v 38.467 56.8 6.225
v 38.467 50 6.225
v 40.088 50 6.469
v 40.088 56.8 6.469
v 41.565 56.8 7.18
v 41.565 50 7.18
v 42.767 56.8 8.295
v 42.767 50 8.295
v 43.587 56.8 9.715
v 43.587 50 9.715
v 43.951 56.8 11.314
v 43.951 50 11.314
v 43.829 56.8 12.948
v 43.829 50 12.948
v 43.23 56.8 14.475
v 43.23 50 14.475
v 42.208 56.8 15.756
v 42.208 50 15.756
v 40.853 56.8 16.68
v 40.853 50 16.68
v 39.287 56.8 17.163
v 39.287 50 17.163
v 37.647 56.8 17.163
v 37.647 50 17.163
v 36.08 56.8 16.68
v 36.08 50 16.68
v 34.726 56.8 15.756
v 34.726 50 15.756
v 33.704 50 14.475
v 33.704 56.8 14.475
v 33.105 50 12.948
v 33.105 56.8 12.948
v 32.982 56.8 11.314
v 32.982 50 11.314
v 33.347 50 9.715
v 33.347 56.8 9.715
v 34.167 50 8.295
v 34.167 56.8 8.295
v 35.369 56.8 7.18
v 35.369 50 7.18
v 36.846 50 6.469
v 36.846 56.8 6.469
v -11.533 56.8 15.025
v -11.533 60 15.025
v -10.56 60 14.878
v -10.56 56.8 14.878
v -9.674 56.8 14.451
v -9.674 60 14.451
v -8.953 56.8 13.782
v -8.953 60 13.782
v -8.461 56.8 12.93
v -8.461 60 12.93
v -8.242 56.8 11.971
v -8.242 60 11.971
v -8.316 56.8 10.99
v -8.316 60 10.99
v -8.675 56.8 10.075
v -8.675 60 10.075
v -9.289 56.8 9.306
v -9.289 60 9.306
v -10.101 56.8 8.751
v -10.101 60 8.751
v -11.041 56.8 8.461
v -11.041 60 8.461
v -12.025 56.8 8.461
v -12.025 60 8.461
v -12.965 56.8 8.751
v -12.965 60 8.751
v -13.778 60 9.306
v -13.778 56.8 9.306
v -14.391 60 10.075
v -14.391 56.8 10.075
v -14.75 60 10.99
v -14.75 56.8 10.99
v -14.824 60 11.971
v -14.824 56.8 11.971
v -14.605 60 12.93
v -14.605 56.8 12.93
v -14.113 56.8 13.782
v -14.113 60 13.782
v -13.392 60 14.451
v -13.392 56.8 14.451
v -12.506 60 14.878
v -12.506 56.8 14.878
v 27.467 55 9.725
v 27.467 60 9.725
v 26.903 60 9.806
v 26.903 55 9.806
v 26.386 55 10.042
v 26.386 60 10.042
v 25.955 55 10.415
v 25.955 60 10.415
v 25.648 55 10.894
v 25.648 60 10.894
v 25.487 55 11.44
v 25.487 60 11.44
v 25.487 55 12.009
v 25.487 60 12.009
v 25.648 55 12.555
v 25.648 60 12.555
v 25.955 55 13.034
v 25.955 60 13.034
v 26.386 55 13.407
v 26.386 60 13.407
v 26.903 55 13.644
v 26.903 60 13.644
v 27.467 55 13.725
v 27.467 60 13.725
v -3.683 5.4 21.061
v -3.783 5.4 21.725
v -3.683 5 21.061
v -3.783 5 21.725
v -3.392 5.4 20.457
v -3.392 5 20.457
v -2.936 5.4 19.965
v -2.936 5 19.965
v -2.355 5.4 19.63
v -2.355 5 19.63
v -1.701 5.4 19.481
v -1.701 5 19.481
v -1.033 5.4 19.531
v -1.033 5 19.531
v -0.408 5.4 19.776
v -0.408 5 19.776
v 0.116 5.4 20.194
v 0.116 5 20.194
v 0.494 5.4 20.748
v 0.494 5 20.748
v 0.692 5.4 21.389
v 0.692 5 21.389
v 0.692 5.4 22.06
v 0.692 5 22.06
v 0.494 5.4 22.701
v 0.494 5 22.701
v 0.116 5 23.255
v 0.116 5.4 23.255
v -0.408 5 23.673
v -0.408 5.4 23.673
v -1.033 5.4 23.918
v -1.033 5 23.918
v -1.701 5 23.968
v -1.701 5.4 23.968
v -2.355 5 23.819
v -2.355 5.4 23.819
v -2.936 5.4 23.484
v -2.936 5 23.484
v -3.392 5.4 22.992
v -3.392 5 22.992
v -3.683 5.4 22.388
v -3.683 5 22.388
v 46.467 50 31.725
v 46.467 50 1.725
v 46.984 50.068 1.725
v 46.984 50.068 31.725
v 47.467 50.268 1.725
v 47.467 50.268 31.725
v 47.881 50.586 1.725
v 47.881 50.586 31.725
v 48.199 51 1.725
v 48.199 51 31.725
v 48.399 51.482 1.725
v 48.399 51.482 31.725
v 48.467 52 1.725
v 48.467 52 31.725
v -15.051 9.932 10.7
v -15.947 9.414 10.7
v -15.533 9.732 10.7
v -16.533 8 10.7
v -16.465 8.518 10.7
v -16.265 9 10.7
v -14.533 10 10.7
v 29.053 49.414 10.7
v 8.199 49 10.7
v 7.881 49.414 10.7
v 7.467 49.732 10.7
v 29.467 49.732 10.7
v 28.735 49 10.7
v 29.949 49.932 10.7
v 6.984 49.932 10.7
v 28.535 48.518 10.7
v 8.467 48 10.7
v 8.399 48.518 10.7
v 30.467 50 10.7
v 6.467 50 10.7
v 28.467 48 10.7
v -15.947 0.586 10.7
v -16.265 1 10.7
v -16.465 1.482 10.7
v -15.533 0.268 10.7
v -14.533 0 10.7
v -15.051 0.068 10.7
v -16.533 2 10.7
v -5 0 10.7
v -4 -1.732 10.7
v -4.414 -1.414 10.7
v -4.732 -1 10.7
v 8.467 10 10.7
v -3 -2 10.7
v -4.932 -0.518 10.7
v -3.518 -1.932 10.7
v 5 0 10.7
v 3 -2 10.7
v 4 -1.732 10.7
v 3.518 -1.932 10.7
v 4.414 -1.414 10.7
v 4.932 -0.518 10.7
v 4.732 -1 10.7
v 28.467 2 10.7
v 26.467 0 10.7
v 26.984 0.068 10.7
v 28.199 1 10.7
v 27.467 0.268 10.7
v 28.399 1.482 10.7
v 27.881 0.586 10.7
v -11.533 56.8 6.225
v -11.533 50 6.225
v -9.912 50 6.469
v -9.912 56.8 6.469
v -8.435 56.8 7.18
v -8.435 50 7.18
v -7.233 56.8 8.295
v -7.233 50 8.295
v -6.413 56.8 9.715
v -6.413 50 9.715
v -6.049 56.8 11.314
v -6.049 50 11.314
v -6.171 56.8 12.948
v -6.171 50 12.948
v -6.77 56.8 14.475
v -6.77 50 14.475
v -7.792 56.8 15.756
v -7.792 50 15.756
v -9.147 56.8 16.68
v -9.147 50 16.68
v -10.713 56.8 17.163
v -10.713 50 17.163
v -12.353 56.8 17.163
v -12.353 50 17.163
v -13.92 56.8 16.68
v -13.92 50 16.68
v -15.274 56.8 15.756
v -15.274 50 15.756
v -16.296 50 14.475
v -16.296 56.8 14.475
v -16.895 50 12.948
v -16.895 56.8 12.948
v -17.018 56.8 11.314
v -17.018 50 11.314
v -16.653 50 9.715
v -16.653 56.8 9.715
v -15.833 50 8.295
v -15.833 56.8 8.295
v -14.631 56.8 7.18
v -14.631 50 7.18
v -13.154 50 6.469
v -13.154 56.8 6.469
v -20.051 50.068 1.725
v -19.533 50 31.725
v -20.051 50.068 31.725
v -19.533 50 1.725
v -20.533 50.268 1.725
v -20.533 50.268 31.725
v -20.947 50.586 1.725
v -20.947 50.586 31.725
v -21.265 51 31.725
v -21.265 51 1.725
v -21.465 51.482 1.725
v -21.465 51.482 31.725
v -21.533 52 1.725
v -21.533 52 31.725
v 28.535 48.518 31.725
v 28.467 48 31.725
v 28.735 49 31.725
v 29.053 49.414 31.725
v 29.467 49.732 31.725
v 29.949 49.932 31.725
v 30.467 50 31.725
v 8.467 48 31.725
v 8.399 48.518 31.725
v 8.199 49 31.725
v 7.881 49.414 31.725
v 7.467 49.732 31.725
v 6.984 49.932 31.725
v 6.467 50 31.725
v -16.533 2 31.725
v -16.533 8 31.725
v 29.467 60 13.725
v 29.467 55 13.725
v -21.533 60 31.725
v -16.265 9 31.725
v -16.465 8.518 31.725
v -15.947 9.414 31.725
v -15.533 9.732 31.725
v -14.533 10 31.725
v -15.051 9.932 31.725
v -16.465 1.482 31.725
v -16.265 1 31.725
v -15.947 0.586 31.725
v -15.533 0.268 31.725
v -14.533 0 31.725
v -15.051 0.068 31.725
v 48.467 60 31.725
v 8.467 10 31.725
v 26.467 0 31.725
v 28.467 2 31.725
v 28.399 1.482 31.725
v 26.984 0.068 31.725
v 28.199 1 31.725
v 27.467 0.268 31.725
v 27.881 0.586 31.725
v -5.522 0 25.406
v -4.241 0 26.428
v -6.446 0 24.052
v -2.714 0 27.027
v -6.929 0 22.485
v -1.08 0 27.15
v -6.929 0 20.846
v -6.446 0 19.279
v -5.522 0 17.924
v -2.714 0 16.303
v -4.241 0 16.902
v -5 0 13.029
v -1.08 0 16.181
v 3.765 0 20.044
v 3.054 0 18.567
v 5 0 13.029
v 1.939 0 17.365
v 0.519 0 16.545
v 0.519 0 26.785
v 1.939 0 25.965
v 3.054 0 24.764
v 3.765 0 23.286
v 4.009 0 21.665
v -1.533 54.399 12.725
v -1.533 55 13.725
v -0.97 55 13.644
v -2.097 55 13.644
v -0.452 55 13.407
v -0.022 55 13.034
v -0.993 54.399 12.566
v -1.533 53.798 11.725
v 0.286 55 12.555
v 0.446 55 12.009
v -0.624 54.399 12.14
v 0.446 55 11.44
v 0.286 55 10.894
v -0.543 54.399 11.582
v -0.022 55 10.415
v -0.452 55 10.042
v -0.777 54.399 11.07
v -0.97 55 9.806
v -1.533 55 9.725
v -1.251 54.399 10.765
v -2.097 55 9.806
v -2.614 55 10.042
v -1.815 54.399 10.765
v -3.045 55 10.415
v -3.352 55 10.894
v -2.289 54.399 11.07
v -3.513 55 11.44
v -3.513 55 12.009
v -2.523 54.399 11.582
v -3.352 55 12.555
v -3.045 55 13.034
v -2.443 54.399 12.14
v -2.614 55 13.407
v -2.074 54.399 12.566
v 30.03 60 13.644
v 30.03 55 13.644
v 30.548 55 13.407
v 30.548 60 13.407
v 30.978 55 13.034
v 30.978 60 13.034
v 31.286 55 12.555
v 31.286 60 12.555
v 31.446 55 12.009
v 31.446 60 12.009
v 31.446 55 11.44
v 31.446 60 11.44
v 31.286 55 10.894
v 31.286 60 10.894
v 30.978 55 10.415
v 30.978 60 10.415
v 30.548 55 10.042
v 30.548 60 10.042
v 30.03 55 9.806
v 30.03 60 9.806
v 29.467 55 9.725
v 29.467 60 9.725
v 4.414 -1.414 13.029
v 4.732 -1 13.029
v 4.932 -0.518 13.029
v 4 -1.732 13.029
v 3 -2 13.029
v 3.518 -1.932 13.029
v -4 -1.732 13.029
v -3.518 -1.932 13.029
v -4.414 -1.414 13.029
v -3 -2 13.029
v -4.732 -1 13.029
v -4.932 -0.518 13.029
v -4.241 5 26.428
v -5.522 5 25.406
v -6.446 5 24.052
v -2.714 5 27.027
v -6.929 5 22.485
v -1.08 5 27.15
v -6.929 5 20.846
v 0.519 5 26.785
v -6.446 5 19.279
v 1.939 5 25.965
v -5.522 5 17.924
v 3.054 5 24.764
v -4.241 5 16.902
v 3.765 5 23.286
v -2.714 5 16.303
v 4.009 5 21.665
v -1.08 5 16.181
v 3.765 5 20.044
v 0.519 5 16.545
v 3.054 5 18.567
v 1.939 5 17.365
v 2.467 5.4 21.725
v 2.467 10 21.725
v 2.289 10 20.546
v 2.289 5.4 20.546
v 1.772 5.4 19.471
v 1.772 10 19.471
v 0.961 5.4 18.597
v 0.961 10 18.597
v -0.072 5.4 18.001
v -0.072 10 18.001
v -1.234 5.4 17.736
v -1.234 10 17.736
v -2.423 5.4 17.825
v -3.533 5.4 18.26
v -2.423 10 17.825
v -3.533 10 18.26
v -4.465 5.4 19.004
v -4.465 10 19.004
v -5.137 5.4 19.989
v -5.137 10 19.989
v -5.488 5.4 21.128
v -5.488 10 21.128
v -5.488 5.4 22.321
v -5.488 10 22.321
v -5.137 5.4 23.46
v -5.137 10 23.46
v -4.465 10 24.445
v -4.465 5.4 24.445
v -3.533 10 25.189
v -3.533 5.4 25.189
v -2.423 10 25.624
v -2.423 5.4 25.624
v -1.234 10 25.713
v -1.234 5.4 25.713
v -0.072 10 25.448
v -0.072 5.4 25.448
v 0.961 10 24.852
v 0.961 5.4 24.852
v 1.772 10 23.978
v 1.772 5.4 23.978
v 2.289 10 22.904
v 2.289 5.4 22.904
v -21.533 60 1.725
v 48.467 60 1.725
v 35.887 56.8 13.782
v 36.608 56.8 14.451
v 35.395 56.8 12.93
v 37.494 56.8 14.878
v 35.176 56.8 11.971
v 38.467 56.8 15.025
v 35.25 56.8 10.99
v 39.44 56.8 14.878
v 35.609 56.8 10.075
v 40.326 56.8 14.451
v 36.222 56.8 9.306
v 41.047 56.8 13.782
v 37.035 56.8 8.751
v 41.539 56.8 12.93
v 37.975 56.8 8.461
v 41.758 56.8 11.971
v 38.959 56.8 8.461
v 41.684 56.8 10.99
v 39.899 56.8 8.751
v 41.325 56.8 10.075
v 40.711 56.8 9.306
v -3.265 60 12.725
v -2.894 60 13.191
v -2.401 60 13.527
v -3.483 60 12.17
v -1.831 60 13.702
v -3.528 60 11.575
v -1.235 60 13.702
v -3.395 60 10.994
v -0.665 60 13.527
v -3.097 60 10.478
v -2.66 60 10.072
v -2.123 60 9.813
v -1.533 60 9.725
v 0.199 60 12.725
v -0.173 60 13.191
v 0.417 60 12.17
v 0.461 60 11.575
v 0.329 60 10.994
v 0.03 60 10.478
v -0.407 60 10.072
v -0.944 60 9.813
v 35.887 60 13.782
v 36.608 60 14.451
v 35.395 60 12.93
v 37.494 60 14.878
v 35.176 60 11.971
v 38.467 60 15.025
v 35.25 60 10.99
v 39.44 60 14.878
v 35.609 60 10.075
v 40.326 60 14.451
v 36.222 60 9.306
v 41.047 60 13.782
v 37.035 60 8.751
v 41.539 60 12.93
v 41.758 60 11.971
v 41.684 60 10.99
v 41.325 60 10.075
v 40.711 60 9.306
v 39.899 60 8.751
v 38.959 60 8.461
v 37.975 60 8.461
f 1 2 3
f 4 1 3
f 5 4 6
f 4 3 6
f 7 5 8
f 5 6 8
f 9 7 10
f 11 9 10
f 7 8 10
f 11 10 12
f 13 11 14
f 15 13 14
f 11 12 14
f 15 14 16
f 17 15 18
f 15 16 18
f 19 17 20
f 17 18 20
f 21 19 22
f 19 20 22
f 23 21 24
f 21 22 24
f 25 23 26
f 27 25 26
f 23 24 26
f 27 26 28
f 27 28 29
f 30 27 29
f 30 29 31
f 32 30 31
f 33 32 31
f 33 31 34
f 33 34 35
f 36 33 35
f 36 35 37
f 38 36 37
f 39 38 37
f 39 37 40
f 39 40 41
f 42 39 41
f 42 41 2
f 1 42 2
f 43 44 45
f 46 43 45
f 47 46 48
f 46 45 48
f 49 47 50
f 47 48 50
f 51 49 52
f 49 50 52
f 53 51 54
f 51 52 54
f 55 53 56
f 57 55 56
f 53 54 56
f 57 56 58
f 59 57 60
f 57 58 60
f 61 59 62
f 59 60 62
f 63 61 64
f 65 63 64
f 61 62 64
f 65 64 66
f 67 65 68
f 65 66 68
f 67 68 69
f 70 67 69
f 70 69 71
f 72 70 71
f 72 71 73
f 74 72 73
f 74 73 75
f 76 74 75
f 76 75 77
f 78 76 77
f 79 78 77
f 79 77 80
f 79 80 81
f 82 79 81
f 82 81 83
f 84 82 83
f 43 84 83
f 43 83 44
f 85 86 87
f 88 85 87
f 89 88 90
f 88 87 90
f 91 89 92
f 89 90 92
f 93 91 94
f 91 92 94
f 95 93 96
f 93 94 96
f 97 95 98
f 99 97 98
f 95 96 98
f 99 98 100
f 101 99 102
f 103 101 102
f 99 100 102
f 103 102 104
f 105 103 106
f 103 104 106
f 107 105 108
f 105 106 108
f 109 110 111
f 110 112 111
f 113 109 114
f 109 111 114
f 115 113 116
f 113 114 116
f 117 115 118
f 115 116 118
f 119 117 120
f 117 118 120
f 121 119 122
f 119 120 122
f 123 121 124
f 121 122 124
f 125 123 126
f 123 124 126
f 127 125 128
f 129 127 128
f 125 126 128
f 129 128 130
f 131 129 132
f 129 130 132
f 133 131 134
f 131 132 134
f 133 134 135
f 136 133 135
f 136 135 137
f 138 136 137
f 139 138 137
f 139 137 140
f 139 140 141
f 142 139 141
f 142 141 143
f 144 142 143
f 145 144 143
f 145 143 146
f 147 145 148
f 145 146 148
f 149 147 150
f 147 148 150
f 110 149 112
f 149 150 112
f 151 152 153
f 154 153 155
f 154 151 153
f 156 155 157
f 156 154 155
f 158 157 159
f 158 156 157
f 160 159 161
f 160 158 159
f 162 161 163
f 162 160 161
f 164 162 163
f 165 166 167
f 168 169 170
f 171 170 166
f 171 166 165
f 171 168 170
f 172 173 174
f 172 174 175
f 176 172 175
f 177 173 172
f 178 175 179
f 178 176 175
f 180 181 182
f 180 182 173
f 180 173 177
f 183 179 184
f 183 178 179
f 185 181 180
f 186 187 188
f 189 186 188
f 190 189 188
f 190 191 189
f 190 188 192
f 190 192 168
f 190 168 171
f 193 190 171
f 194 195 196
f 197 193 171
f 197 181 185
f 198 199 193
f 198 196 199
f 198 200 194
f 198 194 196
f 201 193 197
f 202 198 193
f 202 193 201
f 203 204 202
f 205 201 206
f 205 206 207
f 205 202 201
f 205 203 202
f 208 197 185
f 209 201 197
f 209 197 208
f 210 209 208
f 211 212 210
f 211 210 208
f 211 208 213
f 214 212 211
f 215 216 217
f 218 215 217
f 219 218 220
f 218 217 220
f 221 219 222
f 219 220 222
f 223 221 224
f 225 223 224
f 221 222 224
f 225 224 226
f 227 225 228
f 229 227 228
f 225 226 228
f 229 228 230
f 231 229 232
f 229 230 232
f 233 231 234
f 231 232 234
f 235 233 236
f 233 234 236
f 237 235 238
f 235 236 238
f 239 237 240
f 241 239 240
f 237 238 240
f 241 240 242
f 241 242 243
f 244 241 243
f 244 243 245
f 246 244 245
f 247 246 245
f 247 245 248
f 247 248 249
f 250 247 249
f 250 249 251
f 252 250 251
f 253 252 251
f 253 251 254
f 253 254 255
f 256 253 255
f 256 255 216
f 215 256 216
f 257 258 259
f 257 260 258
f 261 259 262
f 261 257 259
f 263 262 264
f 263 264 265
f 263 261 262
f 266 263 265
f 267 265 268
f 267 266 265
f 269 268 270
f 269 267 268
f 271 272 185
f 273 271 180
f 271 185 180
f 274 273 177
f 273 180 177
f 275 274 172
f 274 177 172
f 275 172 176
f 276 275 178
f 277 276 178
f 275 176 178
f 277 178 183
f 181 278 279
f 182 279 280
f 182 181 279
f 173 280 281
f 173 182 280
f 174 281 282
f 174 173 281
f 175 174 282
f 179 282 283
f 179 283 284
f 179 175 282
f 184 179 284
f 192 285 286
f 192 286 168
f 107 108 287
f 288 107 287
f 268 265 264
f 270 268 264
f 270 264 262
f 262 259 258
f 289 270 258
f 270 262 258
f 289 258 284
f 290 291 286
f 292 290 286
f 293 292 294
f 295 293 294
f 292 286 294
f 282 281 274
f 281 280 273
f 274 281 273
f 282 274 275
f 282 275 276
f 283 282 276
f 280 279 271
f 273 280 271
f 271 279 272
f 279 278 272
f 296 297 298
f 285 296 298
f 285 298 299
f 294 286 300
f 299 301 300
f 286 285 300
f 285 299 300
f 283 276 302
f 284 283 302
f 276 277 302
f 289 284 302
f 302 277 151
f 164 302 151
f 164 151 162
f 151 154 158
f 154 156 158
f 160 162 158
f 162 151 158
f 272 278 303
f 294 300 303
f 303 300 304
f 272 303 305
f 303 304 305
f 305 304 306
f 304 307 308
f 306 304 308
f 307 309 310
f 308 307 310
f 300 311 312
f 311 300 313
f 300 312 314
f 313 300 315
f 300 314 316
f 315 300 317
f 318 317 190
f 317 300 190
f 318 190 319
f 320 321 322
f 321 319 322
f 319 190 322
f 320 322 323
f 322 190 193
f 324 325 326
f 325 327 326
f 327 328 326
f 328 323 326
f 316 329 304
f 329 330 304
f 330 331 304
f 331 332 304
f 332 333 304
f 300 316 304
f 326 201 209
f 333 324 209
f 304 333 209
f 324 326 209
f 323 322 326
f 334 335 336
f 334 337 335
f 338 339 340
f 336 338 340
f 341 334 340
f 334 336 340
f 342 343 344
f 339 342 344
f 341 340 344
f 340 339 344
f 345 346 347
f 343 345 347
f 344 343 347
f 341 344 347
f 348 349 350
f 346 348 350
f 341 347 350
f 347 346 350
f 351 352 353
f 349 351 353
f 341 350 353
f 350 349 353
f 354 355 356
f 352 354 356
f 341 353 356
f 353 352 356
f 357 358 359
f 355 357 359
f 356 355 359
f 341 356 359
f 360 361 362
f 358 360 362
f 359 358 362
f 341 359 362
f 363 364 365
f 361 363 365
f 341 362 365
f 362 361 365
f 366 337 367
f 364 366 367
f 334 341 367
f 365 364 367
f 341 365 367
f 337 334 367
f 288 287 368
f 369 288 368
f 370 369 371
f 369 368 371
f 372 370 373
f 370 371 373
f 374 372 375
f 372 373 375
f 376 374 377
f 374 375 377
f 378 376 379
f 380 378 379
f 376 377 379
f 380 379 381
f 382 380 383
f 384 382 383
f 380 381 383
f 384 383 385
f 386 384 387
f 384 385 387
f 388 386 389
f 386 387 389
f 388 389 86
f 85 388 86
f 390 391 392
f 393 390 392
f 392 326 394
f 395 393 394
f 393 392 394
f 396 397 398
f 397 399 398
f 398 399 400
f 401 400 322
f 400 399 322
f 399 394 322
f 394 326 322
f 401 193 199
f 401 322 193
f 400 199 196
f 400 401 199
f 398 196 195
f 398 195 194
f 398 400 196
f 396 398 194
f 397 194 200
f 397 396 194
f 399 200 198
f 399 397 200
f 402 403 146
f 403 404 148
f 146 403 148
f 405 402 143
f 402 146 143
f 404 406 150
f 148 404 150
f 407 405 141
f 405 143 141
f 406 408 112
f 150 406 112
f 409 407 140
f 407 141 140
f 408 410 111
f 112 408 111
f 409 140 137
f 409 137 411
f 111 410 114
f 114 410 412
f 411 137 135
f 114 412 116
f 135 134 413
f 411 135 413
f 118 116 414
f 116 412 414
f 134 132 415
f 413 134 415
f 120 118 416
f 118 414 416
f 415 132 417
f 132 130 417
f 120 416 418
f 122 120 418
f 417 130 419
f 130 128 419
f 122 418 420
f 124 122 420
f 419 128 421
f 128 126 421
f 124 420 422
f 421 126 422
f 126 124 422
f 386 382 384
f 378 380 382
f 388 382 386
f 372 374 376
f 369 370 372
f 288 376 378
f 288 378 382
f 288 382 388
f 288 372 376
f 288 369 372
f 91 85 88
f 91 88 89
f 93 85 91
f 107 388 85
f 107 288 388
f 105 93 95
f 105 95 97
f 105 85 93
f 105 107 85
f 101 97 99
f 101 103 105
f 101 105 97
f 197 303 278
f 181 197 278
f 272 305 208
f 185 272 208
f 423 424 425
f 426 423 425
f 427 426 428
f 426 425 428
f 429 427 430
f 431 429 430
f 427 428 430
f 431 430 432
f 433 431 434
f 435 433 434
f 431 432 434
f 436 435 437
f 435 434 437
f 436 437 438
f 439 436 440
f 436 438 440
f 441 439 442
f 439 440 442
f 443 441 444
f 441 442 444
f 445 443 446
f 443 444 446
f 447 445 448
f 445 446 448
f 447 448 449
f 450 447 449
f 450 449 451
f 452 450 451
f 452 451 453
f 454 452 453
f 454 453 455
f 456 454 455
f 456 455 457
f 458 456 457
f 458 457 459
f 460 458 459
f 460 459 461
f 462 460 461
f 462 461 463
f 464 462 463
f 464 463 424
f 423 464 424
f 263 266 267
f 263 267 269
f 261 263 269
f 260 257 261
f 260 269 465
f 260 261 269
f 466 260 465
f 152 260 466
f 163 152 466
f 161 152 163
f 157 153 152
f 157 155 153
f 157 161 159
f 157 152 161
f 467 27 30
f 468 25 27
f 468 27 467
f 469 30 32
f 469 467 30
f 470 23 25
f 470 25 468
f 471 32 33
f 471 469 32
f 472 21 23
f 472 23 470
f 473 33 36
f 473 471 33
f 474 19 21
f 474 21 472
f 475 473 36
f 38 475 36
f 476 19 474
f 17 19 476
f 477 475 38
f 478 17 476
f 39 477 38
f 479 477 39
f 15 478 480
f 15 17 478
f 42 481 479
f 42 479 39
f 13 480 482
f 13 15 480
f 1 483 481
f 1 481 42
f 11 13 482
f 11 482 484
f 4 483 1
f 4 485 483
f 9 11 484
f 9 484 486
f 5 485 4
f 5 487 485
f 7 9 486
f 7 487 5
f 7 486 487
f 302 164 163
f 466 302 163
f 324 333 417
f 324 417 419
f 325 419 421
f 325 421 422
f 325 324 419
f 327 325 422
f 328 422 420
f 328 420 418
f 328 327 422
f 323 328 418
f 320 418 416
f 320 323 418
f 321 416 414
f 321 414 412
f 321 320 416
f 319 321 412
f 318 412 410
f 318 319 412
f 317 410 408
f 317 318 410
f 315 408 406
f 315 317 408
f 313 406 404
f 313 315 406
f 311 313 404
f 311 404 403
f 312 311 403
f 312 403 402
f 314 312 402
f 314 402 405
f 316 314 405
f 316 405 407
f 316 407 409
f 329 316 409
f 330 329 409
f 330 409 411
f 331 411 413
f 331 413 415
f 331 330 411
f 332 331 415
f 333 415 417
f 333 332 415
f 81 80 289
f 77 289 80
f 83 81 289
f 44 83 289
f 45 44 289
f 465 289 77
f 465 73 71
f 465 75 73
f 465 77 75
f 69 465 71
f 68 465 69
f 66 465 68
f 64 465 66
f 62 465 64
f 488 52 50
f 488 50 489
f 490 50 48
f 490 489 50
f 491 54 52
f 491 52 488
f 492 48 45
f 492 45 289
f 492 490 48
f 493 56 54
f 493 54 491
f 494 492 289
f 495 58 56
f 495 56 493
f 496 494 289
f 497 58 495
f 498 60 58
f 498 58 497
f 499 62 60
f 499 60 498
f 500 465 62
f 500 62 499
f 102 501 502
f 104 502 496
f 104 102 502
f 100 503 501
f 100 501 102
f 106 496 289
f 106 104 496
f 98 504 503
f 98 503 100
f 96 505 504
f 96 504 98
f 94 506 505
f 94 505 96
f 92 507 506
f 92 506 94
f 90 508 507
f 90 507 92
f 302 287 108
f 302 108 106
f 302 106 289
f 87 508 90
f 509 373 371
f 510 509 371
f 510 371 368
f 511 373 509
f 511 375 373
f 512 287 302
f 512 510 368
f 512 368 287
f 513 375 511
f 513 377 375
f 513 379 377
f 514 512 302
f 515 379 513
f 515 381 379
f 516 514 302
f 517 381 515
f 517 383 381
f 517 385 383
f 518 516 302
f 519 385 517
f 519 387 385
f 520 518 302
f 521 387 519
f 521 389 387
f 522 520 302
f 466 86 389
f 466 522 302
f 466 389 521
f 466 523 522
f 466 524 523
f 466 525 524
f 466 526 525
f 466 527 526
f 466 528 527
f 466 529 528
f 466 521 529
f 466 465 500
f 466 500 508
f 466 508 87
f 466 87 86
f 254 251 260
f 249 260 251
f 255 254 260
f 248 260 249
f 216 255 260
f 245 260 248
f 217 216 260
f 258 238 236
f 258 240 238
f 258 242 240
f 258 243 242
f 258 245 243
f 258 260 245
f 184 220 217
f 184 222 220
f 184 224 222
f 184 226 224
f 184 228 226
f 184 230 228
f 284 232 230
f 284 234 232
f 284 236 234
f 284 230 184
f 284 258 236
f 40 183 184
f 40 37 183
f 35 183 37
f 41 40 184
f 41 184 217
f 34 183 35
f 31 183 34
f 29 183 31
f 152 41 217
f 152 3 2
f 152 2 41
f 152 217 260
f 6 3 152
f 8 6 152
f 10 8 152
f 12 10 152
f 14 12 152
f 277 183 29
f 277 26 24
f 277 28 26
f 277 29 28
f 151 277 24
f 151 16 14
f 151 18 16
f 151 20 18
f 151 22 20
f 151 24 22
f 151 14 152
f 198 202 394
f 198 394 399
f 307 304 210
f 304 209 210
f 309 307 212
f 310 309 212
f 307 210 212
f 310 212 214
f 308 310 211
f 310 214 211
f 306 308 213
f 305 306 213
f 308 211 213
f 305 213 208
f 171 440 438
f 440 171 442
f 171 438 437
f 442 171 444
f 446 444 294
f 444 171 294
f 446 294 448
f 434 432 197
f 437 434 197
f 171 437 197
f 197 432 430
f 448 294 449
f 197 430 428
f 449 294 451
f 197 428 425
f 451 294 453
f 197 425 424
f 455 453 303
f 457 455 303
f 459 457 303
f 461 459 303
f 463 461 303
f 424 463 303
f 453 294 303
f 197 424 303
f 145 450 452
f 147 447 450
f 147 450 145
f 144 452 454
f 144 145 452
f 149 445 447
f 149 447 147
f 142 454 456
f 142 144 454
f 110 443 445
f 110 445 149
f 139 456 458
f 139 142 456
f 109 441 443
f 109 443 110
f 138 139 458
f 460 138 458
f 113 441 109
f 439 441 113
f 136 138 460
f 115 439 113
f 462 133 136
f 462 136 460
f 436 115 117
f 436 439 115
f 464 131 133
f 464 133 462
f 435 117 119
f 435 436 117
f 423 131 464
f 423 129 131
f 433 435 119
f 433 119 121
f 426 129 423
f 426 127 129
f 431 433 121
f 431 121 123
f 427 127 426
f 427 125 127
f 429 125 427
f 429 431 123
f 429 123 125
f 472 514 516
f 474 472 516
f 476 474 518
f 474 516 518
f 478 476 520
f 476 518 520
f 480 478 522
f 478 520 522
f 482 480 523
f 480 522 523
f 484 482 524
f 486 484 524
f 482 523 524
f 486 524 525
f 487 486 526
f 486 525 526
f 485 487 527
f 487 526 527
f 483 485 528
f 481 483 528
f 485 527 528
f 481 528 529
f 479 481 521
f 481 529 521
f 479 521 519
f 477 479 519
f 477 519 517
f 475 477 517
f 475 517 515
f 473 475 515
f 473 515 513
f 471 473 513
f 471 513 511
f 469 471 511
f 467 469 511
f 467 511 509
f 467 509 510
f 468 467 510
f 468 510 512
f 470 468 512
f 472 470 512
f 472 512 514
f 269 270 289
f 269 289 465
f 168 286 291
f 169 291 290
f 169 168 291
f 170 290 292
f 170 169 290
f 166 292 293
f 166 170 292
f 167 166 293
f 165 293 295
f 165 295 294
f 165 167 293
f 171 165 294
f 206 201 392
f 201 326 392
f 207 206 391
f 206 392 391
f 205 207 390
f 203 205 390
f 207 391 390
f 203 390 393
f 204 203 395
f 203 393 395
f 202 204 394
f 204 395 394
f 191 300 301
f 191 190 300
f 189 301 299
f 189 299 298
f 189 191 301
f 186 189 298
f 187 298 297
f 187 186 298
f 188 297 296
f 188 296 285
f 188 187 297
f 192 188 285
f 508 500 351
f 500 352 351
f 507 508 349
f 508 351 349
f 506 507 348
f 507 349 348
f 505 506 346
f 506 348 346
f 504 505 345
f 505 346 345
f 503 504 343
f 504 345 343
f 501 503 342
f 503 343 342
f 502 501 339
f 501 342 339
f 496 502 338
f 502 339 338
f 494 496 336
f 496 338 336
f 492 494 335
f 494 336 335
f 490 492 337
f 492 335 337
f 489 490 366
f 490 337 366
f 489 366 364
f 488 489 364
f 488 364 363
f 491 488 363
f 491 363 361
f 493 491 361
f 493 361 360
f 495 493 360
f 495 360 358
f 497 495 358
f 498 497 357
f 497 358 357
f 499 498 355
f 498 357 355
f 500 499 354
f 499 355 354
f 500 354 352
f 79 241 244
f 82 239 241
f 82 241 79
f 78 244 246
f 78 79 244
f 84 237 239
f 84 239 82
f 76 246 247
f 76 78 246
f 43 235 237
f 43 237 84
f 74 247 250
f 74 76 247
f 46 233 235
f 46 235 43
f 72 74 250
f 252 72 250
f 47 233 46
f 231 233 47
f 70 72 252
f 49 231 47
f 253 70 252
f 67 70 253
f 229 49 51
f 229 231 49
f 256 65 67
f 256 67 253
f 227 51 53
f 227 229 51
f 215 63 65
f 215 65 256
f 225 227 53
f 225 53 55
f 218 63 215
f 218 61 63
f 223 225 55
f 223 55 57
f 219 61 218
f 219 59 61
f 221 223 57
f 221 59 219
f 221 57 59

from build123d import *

# Parameters (mm, degrees)
SKETCH_8_W                = 70
SKETCH_8_H                = 30
EXTRUDE_3_DEPTH           = 60
SKETCH_9_W                = 30
SKETCH_9_H                = 40
SKETCH_9_W_2              = 20
CUT_EXTRUDE_3_DEPTH       = 83.758884896
OTHER_1_OUTLINE_R         = 5.5
OTHER_1_DEPTH             = 5
HOLE_WIZARD_2_D           = 4.5
HOLE_WIZARD_2_DEPTH       = 10
HOLE_WIZARD_2_CBORE_D     = 8
HOLE_WIZARD_2_CBORE_DEPTH = 4.6
BACK_REACH                = 85.4
SKETCH_16_W               = 70
SKETCH_16_H               = 8.975361008
MM_1_D                    = 4
MM_1_DEPTH                = 5
MM_1_TIP                  = 1.201721238
CUT_EXTRUDE_5_DEPTH       = 5
SKETCH_24_W               = 5
SKETCH_24_H               = 21.024638992
SKETCH_24_W_2             = 20
CUT_EXTRUDE_6_DEPTH       = 10
HOLE_WIZARD_3_D           = 6.6
HOLE_WIZARD_3_DEPTH       = 10
HOLE_WIZARD_3_CBORE_D     = 11
HOLE_WIZARD_3_CBORE_DEPTH = 6.8
FILLET_1_R                = 2
SKETCH_29_W               = 10
SKETCH_29_H               = 2
EXTRUDE_5_DEPTH           = 2.329281552
FILLET_3_R                = 2


# Read off the part's stored shape, not the designer's step: 孔1
with BuildPart() as part:
    # 草图8 → 凸台-拉伸3 (new body)
    with BuildSketch(Plane(origin=(0, 0, 0), x_dir=(1, 0, 0), z_dir=(0, 1, 0))):
        with Locations((13.466824006, -16.724598186)):
            Rectangle(SKETCH_8_W, SKETCH_8_H)
    extrude(amount=EXTRUDE_3_DEPTH)

    # 草图9 → 切除-拉伸3 (cut, through all)
    with BuildSketch(Plane.XY.offset(31.724598186)):
        with Locations((-6.533175994, 30)):
            Rectangle(SKETCH_9_W, SKETCH_9_H)
        with Locations((38.466824006, 30)):
            Rectangle(SKETCH_9_W_2, SKETCH_9_H)
    extrude(amount=-CUT_EXTRUDE_3_DEPTH, mode=Mode.SUBTRACT)

    # 孔1 outline → 孔1 (cut)
    with BuildSketch(Plane(origin=(0, 0, 0), x_dir=(1, 0, 0), z_dir=(0, 1, 0))):
        with Locations((-1.490630647, -21.665240746)):
            Circle(OTHER_1_OUTLINE_R)
    extrude(amount=OTHER_1_DEPTH, mode=Mode.SUBTRACT)

    # 打孔尺寸(%根据)内六角圆柱头螺钉的类型2
    with Locations(Plane(origin=(-1.533175994, 10, 21.724598186), x_dir=(1, 0, 0), z_dir=(0, 1, 0))):
        with Locations((0, 0)):
            CounterBoreHole(HOLE_WIZARD_2_D / 2, HOLE_WIZARD_2_CBORE_D / 2, HOLE_WIZARD_2_CBORE_DEPTH, depth=HOLE_WIZARD_2_DEPTH)

    # back: up to this face of the body (flat: up to its plane)
    back_end = Plane(part.part.faces().sort_by_distance((-6.533175994, 50, 16.724598186))[0])
    # 草图16 → back (cut, up to the picked face)
    with BuildSketch(Plane(origin=(0, 0, 0), x_dir=(1, 0, 0), z_dir=(0, 1, 0)), mode=Mode.PRIVATE) as back_sk1:
        with Locations((13.466824006, -6.21227869)):
            Rectangle(SKETCH_16_W, SKETCH_16_H)
    back_tool1 = split(extrude(back_sk1.sketch, amount=BACK_REACH, mode=Mode.PRIVATE), bisect_by=back_end, keep=Keep.BOTH, mode=Mode.PRIVATE)
    add(back_tool1.solids().sort_by(Axis((13.466824, 0, 6.212279), (0, 1, 0)))[0], mode=Mode.SUBTRACT)

    # 大小mm 暗销孔1
    with Locations(Plane(origin=(-1.533175994, 60, 11.724598186), x_dir=(0, 0, 1), z_dir=(0, 1, 0))):
        with Locations((0, 0)):
            Hole(MM_1_D / 2, depth=MM_1_DEPTH)
            with Locations((0, 0, -(MM_1_DEPTH + MM_1_TIP / 2))):  # 118° drill point
                Cone(0, MM_1_D / 2, MM_1_TIP, mode=Mode.SUBTRACT)

    # 草图23 → 切除-拉伸5 (cut)
    with BuildSketch(Plane.XZ.offset(-60)):
        with BuildLine():
            Line((29.466824006, 9.724598186), (27.466824006, 9.724598186))
            ThreePointArc((27.466824006, 9.724598186), (25.466824006, 11.724598186), (27.466824006, 13.724598186))
            Line((27.466824006, 13.724598186), (29.466824006, 13.724598186))
            ThreePointArc((29.466824006, 13.724598186), (31.466824006, 11.724598186), (29.466824006, 9.724598186))
        make_face()
    extrude(amount=CUT_EXTRUDE_5_DEPTH, mode=Mode.SUBTRACT)

    # 草图24 → 切除-拉伸6 (cut)
    with BuildSketch(Plane(origin=(0, 0, 0), x_dir=(1, 0, 0), z_dir=(0, 1, 0))):
        with Locations((-19.033175994, -21.21227869)):
            Rectangle(SKETCH_24_W, SKETCH_24_H)
        with Locations((38.466824006, -21.21227869)):
            Rectangle(SKETCH_24_W_2, SKETCH_24_H)
    extrude(amount=CUT_EXTRUDE_6_DEPTH, mode=Mode.SUBTRACT)

    # 打孔尺寸(%根据)内六角圆柱头螺钉的类型3
    with Locations(Plane(origin=(-11.533175994, 50, 11.724598186), x_dir=(0, 0, -1), z_dir=(0, -1, 0))):
        with Locations((0, 0), (0, 50)):
            CounterBoreHole(HOLE_WIZARD_3_D / 2, HOLE_WIZARD_3_CBORE_D / 2, HOLE_WIZARD_3_CBORE_DEPTH, depth=HOLE_WIZARD_3_DEPTH)

    # 圆角1
    fillet_1_edges = [part.edges().sort_by_distance(p)[0] for p in [
        (-16.533175994, 0, 21.21227869),
        (-16.533175994, 10, 21.21227869),
        (28.466824006, 0, 21.21227869),
        (-21.533175994, 50, 16.724598186),
        (48.466824006, 50, 16.724598186),
        (8.466824006, 50, 21.21227869),
        (28.466824006, 50, 21.21227869),
    ]]
    fillet(fillet_1_edges, radius=FILLET_1_R)

    # 草图29 → 凸台-拉伸5 (add)
    with BuildSketch(Plane(origin=(0, 0, 10.699959194), x_dir=(-1, 0, 0), z_dir=(0, 0, -1))):
        with Locations((0, -1)):
            Rectangle(SKETCH_29_W, SKETCH_29_H)
    extrude(amount=-EXTRUDE_5_DEPTH)

    # 圆角3
    fillet_3_edges = [part.edges().sort_by_distance(p)[0] for p in [
        (-5, -2, 11.86459997),
        (5, -2, 11.86459997),
    ]]
    fillet(fillet_3_edges, radius=FILLET_3_R - 0.0001)  # a hair under: the kernel refuses the full size


solid = part.part
